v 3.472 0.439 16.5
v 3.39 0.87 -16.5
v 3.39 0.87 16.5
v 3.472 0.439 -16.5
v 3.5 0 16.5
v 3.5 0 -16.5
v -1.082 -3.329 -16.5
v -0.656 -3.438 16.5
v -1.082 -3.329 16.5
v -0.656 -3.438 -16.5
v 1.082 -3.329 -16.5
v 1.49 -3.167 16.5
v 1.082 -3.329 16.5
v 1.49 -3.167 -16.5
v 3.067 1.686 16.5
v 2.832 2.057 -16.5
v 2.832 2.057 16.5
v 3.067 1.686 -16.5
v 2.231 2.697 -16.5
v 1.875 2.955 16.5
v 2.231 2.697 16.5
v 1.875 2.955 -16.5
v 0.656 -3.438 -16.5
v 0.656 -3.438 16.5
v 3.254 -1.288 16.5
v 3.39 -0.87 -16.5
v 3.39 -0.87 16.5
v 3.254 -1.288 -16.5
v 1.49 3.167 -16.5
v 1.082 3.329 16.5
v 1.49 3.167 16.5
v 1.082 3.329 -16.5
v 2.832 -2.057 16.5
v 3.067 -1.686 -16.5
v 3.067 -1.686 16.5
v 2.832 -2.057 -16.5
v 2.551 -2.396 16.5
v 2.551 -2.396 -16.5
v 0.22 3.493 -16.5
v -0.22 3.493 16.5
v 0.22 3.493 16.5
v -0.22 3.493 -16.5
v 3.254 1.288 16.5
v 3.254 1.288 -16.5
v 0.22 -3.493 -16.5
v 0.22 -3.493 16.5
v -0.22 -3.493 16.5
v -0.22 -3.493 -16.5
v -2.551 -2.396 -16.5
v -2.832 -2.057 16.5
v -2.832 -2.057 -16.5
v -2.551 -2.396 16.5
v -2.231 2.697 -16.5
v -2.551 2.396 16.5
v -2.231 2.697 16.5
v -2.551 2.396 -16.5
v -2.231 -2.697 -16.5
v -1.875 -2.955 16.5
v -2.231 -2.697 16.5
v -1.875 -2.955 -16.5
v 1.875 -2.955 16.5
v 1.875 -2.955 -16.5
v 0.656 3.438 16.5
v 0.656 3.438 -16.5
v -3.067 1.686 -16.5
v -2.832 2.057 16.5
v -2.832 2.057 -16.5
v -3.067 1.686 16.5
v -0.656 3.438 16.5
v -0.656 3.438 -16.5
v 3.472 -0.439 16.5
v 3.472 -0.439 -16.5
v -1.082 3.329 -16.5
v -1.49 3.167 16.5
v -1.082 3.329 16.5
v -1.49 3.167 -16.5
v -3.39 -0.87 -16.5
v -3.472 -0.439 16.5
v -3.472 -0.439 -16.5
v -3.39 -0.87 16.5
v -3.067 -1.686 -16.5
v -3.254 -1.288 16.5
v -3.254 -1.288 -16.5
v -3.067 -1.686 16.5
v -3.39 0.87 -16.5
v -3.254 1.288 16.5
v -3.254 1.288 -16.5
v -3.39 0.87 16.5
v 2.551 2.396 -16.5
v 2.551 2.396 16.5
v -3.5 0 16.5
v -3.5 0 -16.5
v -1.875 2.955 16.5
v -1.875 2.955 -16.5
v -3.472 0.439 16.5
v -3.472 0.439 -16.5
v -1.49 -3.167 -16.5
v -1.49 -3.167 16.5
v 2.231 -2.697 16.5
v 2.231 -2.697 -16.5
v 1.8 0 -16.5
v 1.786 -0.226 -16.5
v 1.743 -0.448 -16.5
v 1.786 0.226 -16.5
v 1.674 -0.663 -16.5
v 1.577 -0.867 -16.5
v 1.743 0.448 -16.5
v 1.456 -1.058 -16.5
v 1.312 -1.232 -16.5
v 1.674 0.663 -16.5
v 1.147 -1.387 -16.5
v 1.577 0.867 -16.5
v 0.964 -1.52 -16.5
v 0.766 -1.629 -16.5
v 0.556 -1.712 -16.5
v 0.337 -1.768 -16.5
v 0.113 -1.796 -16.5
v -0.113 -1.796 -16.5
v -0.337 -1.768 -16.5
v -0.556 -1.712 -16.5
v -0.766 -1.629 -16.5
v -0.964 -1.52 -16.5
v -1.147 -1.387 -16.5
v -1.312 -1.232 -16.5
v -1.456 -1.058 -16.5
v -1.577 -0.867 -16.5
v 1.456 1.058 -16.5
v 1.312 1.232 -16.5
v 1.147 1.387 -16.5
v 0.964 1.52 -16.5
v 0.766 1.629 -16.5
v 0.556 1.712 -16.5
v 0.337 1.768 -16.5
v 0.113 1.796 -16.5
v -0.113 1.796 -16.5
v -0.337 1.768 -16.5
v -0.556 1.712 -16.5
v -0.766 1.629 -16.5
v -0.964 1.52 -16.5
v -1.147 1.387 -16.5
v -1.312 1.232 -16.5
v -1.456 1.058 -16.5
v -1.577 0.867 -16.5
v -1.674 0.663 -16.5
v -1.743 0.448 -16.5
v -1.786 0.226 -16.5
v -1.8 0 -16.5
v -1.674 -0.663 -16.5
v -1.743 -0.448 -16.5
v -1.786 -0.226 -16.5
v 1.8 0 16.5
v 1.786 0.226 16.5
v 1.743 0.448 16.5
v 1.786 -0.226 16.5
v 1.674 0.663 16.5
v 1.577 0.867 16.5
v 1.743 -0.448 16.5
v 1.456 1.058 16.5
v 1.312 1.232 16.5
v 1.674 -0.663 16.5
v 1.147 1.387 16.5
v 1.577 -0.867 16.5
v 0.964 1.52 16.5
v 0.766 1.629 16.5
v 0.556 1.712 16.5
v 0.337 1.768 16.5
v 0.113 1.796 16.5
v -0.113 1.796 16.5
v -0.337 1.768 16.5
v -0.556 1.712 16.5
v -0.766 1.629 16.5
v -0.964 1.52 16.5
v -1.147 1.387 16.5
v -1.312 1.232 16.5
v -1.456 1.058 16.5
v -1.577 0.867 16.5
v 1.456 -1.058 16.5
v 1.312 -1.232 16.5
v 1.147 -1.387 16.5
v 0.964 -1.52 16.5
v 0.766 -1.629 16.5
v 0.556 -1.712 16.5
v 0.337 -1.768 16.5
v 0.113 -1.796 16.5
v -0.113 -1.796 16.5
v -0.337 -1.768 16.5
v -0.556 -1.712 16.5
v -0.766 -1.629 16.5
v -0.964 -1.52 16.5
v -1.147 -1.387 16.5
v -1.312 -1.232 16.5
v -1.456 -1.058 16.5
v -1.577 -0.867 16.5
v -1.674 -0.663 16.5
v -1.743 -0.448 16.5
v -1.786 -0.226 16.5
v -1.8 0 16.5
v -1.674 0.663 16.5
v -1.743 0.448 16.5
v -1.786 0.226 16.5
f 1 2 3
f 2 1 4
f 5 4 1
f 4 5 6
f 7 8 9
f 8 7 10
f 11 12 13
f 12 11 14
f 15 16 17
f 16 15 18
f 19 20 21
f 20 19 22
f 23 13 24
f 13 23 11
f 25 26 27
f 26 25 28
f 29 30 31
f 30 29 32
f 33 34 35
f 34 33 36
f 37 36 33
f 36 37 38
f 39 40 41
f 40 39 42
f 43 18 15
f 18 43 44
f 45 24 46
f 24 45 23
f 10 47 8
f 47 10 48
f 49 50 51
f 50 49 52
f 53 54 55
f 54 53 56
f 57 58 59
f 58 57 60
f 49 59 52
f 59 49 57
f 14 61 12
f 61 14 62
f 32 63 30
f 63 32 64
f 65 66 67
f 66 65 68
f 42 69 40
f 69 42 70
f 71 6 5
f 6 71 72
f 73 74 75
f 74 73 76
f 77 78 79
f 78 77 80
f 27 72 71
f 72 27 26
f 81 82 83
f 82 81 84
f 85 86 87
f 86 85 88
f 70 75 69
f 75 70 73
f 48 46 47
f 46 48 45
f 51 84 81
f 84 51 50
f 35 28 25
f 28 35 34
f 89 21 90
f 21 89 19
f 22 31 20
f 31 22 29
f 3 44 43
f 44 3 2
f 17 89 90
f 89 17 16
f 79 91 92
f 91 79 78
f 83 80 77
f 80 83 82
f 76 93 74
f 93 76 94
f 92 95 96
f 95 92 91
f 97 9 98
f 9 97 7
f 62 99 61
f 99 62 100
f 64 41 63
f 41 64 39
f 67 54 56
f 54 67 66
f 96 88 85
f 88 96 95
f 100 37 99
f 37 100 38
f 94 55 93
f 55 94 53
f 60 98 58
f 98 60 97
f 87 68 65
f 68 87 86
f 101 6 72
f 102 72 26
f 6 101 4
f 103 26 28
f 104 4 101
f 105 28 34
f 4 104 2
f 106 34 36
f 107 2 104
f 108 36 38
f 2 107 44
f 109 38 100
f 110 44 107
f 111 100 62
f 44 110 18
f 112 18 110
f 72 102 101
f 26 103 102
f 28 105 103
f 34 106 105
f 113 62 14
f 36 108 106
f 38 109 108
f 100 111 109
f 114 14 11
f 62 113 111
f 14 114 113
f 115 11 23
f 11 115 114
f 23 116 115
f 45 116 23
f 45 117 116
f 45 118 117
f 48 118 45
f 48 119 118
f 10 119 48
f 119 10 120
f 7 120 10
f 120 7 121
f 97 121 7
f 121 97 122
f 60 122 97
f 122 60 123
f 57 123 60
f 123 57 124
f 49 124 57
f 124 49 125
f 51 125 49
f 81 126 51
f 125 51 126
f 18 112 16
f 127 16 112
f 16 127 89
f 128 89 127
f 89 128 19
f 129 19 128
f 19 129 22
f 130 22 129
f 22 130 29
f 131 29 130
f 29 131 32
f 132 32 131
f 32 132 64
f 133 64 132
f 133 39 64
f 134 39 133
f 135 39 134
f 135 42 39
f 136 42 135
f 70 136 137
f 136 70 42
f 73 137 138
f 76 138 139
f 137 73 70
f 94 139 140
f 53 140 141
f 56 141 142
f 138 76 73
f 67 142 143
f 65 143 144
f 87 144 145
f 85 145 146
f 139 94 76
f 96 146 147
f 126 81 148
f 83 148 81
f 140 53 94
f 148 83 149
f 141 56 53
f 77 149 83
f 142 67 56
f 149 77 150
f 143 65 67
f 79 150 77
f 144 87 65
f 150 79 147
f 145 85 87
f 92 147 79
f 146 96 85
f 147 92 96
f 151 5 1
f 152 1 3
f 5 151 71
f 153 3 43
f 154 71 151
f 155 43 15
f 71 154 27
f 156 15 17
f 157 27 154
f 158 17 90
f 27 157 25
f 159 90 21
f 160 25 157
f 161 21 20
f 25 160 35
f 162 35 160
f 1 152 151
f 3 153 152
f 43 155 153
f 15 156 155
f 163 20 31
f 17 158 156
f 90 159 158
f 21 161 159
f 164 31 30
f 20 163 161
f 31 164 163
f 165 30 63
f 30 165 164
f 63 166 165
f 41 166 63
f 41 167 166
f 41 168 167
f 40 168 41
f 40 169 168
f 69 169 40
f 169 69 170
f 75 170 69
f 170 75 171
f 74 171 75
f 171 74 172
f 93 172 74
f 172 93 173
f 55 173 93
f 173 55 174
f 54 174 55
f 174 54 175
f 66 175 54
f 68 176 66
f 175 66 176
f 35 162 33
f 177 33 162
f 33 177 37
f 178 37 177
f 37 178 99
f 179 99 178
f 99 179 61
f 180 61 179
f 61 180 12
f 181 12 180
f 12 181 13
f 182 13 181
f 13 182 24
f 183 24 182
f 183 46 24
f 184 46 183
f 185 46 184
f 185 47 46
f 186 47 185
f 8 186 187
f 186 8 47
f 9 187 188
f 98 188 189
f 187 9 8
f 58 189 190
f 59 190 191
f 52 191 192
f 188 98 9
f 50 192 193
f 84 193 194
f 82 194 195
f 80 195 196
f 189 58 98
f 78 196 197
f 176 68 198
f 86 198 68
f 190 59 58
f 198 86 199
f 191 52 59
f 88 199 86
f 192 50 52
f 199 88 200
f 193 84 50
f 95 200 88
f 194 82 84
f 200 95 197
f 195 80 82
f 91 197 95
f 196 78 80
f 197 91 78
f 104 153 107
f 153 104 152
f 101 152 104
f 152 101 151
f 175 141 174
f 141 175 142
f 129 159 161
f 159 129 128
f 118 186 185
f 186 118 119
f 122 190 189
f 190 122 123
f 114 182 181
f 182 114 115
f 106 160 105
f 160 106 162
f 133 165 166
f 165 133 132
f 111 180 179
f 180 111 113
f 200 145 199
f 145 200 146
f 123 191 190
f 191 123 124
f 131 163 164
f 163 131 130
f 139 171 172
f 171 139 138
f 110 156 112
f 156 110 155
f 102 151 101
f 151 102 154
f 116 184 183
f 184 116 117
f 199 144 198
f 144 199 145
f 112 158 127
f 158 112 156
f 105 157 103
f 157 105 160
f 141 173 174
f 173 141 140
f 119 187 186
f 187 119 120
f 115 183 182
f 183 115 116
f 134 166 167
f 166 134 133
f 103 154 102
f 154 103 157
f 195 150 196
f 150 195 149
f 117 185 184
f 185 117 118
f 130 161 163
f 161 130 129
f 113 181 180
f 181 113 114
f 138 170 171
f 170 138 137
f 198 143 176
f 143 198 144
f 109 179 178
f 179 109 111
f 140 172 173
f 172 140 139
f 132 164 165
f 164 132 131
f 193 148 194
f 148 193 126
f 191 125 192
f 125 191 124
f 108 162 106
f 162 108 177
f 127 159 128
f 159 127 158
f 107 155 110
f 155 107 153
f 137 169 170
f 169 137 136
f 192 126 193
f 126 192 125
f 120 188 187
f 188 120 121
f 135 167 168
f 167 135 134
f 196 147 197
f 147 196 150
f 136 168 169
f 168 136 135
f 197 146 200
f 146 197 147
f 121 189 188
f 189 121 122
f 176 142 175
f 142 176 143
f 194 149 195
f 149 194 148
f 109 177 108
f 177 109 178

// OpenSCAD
$fn = 50;


difference() {
	union() {
		translate(v = [0, 0, -16.5000000000]) {
			cylinder(h = 33, r = 3.5000000000);
		}
	}
	union() {
		#translate(v = [0, 0, -100.0000000000]) {
			cylinder(h = 200, r = 1.8000000000);
		}
	}
}
